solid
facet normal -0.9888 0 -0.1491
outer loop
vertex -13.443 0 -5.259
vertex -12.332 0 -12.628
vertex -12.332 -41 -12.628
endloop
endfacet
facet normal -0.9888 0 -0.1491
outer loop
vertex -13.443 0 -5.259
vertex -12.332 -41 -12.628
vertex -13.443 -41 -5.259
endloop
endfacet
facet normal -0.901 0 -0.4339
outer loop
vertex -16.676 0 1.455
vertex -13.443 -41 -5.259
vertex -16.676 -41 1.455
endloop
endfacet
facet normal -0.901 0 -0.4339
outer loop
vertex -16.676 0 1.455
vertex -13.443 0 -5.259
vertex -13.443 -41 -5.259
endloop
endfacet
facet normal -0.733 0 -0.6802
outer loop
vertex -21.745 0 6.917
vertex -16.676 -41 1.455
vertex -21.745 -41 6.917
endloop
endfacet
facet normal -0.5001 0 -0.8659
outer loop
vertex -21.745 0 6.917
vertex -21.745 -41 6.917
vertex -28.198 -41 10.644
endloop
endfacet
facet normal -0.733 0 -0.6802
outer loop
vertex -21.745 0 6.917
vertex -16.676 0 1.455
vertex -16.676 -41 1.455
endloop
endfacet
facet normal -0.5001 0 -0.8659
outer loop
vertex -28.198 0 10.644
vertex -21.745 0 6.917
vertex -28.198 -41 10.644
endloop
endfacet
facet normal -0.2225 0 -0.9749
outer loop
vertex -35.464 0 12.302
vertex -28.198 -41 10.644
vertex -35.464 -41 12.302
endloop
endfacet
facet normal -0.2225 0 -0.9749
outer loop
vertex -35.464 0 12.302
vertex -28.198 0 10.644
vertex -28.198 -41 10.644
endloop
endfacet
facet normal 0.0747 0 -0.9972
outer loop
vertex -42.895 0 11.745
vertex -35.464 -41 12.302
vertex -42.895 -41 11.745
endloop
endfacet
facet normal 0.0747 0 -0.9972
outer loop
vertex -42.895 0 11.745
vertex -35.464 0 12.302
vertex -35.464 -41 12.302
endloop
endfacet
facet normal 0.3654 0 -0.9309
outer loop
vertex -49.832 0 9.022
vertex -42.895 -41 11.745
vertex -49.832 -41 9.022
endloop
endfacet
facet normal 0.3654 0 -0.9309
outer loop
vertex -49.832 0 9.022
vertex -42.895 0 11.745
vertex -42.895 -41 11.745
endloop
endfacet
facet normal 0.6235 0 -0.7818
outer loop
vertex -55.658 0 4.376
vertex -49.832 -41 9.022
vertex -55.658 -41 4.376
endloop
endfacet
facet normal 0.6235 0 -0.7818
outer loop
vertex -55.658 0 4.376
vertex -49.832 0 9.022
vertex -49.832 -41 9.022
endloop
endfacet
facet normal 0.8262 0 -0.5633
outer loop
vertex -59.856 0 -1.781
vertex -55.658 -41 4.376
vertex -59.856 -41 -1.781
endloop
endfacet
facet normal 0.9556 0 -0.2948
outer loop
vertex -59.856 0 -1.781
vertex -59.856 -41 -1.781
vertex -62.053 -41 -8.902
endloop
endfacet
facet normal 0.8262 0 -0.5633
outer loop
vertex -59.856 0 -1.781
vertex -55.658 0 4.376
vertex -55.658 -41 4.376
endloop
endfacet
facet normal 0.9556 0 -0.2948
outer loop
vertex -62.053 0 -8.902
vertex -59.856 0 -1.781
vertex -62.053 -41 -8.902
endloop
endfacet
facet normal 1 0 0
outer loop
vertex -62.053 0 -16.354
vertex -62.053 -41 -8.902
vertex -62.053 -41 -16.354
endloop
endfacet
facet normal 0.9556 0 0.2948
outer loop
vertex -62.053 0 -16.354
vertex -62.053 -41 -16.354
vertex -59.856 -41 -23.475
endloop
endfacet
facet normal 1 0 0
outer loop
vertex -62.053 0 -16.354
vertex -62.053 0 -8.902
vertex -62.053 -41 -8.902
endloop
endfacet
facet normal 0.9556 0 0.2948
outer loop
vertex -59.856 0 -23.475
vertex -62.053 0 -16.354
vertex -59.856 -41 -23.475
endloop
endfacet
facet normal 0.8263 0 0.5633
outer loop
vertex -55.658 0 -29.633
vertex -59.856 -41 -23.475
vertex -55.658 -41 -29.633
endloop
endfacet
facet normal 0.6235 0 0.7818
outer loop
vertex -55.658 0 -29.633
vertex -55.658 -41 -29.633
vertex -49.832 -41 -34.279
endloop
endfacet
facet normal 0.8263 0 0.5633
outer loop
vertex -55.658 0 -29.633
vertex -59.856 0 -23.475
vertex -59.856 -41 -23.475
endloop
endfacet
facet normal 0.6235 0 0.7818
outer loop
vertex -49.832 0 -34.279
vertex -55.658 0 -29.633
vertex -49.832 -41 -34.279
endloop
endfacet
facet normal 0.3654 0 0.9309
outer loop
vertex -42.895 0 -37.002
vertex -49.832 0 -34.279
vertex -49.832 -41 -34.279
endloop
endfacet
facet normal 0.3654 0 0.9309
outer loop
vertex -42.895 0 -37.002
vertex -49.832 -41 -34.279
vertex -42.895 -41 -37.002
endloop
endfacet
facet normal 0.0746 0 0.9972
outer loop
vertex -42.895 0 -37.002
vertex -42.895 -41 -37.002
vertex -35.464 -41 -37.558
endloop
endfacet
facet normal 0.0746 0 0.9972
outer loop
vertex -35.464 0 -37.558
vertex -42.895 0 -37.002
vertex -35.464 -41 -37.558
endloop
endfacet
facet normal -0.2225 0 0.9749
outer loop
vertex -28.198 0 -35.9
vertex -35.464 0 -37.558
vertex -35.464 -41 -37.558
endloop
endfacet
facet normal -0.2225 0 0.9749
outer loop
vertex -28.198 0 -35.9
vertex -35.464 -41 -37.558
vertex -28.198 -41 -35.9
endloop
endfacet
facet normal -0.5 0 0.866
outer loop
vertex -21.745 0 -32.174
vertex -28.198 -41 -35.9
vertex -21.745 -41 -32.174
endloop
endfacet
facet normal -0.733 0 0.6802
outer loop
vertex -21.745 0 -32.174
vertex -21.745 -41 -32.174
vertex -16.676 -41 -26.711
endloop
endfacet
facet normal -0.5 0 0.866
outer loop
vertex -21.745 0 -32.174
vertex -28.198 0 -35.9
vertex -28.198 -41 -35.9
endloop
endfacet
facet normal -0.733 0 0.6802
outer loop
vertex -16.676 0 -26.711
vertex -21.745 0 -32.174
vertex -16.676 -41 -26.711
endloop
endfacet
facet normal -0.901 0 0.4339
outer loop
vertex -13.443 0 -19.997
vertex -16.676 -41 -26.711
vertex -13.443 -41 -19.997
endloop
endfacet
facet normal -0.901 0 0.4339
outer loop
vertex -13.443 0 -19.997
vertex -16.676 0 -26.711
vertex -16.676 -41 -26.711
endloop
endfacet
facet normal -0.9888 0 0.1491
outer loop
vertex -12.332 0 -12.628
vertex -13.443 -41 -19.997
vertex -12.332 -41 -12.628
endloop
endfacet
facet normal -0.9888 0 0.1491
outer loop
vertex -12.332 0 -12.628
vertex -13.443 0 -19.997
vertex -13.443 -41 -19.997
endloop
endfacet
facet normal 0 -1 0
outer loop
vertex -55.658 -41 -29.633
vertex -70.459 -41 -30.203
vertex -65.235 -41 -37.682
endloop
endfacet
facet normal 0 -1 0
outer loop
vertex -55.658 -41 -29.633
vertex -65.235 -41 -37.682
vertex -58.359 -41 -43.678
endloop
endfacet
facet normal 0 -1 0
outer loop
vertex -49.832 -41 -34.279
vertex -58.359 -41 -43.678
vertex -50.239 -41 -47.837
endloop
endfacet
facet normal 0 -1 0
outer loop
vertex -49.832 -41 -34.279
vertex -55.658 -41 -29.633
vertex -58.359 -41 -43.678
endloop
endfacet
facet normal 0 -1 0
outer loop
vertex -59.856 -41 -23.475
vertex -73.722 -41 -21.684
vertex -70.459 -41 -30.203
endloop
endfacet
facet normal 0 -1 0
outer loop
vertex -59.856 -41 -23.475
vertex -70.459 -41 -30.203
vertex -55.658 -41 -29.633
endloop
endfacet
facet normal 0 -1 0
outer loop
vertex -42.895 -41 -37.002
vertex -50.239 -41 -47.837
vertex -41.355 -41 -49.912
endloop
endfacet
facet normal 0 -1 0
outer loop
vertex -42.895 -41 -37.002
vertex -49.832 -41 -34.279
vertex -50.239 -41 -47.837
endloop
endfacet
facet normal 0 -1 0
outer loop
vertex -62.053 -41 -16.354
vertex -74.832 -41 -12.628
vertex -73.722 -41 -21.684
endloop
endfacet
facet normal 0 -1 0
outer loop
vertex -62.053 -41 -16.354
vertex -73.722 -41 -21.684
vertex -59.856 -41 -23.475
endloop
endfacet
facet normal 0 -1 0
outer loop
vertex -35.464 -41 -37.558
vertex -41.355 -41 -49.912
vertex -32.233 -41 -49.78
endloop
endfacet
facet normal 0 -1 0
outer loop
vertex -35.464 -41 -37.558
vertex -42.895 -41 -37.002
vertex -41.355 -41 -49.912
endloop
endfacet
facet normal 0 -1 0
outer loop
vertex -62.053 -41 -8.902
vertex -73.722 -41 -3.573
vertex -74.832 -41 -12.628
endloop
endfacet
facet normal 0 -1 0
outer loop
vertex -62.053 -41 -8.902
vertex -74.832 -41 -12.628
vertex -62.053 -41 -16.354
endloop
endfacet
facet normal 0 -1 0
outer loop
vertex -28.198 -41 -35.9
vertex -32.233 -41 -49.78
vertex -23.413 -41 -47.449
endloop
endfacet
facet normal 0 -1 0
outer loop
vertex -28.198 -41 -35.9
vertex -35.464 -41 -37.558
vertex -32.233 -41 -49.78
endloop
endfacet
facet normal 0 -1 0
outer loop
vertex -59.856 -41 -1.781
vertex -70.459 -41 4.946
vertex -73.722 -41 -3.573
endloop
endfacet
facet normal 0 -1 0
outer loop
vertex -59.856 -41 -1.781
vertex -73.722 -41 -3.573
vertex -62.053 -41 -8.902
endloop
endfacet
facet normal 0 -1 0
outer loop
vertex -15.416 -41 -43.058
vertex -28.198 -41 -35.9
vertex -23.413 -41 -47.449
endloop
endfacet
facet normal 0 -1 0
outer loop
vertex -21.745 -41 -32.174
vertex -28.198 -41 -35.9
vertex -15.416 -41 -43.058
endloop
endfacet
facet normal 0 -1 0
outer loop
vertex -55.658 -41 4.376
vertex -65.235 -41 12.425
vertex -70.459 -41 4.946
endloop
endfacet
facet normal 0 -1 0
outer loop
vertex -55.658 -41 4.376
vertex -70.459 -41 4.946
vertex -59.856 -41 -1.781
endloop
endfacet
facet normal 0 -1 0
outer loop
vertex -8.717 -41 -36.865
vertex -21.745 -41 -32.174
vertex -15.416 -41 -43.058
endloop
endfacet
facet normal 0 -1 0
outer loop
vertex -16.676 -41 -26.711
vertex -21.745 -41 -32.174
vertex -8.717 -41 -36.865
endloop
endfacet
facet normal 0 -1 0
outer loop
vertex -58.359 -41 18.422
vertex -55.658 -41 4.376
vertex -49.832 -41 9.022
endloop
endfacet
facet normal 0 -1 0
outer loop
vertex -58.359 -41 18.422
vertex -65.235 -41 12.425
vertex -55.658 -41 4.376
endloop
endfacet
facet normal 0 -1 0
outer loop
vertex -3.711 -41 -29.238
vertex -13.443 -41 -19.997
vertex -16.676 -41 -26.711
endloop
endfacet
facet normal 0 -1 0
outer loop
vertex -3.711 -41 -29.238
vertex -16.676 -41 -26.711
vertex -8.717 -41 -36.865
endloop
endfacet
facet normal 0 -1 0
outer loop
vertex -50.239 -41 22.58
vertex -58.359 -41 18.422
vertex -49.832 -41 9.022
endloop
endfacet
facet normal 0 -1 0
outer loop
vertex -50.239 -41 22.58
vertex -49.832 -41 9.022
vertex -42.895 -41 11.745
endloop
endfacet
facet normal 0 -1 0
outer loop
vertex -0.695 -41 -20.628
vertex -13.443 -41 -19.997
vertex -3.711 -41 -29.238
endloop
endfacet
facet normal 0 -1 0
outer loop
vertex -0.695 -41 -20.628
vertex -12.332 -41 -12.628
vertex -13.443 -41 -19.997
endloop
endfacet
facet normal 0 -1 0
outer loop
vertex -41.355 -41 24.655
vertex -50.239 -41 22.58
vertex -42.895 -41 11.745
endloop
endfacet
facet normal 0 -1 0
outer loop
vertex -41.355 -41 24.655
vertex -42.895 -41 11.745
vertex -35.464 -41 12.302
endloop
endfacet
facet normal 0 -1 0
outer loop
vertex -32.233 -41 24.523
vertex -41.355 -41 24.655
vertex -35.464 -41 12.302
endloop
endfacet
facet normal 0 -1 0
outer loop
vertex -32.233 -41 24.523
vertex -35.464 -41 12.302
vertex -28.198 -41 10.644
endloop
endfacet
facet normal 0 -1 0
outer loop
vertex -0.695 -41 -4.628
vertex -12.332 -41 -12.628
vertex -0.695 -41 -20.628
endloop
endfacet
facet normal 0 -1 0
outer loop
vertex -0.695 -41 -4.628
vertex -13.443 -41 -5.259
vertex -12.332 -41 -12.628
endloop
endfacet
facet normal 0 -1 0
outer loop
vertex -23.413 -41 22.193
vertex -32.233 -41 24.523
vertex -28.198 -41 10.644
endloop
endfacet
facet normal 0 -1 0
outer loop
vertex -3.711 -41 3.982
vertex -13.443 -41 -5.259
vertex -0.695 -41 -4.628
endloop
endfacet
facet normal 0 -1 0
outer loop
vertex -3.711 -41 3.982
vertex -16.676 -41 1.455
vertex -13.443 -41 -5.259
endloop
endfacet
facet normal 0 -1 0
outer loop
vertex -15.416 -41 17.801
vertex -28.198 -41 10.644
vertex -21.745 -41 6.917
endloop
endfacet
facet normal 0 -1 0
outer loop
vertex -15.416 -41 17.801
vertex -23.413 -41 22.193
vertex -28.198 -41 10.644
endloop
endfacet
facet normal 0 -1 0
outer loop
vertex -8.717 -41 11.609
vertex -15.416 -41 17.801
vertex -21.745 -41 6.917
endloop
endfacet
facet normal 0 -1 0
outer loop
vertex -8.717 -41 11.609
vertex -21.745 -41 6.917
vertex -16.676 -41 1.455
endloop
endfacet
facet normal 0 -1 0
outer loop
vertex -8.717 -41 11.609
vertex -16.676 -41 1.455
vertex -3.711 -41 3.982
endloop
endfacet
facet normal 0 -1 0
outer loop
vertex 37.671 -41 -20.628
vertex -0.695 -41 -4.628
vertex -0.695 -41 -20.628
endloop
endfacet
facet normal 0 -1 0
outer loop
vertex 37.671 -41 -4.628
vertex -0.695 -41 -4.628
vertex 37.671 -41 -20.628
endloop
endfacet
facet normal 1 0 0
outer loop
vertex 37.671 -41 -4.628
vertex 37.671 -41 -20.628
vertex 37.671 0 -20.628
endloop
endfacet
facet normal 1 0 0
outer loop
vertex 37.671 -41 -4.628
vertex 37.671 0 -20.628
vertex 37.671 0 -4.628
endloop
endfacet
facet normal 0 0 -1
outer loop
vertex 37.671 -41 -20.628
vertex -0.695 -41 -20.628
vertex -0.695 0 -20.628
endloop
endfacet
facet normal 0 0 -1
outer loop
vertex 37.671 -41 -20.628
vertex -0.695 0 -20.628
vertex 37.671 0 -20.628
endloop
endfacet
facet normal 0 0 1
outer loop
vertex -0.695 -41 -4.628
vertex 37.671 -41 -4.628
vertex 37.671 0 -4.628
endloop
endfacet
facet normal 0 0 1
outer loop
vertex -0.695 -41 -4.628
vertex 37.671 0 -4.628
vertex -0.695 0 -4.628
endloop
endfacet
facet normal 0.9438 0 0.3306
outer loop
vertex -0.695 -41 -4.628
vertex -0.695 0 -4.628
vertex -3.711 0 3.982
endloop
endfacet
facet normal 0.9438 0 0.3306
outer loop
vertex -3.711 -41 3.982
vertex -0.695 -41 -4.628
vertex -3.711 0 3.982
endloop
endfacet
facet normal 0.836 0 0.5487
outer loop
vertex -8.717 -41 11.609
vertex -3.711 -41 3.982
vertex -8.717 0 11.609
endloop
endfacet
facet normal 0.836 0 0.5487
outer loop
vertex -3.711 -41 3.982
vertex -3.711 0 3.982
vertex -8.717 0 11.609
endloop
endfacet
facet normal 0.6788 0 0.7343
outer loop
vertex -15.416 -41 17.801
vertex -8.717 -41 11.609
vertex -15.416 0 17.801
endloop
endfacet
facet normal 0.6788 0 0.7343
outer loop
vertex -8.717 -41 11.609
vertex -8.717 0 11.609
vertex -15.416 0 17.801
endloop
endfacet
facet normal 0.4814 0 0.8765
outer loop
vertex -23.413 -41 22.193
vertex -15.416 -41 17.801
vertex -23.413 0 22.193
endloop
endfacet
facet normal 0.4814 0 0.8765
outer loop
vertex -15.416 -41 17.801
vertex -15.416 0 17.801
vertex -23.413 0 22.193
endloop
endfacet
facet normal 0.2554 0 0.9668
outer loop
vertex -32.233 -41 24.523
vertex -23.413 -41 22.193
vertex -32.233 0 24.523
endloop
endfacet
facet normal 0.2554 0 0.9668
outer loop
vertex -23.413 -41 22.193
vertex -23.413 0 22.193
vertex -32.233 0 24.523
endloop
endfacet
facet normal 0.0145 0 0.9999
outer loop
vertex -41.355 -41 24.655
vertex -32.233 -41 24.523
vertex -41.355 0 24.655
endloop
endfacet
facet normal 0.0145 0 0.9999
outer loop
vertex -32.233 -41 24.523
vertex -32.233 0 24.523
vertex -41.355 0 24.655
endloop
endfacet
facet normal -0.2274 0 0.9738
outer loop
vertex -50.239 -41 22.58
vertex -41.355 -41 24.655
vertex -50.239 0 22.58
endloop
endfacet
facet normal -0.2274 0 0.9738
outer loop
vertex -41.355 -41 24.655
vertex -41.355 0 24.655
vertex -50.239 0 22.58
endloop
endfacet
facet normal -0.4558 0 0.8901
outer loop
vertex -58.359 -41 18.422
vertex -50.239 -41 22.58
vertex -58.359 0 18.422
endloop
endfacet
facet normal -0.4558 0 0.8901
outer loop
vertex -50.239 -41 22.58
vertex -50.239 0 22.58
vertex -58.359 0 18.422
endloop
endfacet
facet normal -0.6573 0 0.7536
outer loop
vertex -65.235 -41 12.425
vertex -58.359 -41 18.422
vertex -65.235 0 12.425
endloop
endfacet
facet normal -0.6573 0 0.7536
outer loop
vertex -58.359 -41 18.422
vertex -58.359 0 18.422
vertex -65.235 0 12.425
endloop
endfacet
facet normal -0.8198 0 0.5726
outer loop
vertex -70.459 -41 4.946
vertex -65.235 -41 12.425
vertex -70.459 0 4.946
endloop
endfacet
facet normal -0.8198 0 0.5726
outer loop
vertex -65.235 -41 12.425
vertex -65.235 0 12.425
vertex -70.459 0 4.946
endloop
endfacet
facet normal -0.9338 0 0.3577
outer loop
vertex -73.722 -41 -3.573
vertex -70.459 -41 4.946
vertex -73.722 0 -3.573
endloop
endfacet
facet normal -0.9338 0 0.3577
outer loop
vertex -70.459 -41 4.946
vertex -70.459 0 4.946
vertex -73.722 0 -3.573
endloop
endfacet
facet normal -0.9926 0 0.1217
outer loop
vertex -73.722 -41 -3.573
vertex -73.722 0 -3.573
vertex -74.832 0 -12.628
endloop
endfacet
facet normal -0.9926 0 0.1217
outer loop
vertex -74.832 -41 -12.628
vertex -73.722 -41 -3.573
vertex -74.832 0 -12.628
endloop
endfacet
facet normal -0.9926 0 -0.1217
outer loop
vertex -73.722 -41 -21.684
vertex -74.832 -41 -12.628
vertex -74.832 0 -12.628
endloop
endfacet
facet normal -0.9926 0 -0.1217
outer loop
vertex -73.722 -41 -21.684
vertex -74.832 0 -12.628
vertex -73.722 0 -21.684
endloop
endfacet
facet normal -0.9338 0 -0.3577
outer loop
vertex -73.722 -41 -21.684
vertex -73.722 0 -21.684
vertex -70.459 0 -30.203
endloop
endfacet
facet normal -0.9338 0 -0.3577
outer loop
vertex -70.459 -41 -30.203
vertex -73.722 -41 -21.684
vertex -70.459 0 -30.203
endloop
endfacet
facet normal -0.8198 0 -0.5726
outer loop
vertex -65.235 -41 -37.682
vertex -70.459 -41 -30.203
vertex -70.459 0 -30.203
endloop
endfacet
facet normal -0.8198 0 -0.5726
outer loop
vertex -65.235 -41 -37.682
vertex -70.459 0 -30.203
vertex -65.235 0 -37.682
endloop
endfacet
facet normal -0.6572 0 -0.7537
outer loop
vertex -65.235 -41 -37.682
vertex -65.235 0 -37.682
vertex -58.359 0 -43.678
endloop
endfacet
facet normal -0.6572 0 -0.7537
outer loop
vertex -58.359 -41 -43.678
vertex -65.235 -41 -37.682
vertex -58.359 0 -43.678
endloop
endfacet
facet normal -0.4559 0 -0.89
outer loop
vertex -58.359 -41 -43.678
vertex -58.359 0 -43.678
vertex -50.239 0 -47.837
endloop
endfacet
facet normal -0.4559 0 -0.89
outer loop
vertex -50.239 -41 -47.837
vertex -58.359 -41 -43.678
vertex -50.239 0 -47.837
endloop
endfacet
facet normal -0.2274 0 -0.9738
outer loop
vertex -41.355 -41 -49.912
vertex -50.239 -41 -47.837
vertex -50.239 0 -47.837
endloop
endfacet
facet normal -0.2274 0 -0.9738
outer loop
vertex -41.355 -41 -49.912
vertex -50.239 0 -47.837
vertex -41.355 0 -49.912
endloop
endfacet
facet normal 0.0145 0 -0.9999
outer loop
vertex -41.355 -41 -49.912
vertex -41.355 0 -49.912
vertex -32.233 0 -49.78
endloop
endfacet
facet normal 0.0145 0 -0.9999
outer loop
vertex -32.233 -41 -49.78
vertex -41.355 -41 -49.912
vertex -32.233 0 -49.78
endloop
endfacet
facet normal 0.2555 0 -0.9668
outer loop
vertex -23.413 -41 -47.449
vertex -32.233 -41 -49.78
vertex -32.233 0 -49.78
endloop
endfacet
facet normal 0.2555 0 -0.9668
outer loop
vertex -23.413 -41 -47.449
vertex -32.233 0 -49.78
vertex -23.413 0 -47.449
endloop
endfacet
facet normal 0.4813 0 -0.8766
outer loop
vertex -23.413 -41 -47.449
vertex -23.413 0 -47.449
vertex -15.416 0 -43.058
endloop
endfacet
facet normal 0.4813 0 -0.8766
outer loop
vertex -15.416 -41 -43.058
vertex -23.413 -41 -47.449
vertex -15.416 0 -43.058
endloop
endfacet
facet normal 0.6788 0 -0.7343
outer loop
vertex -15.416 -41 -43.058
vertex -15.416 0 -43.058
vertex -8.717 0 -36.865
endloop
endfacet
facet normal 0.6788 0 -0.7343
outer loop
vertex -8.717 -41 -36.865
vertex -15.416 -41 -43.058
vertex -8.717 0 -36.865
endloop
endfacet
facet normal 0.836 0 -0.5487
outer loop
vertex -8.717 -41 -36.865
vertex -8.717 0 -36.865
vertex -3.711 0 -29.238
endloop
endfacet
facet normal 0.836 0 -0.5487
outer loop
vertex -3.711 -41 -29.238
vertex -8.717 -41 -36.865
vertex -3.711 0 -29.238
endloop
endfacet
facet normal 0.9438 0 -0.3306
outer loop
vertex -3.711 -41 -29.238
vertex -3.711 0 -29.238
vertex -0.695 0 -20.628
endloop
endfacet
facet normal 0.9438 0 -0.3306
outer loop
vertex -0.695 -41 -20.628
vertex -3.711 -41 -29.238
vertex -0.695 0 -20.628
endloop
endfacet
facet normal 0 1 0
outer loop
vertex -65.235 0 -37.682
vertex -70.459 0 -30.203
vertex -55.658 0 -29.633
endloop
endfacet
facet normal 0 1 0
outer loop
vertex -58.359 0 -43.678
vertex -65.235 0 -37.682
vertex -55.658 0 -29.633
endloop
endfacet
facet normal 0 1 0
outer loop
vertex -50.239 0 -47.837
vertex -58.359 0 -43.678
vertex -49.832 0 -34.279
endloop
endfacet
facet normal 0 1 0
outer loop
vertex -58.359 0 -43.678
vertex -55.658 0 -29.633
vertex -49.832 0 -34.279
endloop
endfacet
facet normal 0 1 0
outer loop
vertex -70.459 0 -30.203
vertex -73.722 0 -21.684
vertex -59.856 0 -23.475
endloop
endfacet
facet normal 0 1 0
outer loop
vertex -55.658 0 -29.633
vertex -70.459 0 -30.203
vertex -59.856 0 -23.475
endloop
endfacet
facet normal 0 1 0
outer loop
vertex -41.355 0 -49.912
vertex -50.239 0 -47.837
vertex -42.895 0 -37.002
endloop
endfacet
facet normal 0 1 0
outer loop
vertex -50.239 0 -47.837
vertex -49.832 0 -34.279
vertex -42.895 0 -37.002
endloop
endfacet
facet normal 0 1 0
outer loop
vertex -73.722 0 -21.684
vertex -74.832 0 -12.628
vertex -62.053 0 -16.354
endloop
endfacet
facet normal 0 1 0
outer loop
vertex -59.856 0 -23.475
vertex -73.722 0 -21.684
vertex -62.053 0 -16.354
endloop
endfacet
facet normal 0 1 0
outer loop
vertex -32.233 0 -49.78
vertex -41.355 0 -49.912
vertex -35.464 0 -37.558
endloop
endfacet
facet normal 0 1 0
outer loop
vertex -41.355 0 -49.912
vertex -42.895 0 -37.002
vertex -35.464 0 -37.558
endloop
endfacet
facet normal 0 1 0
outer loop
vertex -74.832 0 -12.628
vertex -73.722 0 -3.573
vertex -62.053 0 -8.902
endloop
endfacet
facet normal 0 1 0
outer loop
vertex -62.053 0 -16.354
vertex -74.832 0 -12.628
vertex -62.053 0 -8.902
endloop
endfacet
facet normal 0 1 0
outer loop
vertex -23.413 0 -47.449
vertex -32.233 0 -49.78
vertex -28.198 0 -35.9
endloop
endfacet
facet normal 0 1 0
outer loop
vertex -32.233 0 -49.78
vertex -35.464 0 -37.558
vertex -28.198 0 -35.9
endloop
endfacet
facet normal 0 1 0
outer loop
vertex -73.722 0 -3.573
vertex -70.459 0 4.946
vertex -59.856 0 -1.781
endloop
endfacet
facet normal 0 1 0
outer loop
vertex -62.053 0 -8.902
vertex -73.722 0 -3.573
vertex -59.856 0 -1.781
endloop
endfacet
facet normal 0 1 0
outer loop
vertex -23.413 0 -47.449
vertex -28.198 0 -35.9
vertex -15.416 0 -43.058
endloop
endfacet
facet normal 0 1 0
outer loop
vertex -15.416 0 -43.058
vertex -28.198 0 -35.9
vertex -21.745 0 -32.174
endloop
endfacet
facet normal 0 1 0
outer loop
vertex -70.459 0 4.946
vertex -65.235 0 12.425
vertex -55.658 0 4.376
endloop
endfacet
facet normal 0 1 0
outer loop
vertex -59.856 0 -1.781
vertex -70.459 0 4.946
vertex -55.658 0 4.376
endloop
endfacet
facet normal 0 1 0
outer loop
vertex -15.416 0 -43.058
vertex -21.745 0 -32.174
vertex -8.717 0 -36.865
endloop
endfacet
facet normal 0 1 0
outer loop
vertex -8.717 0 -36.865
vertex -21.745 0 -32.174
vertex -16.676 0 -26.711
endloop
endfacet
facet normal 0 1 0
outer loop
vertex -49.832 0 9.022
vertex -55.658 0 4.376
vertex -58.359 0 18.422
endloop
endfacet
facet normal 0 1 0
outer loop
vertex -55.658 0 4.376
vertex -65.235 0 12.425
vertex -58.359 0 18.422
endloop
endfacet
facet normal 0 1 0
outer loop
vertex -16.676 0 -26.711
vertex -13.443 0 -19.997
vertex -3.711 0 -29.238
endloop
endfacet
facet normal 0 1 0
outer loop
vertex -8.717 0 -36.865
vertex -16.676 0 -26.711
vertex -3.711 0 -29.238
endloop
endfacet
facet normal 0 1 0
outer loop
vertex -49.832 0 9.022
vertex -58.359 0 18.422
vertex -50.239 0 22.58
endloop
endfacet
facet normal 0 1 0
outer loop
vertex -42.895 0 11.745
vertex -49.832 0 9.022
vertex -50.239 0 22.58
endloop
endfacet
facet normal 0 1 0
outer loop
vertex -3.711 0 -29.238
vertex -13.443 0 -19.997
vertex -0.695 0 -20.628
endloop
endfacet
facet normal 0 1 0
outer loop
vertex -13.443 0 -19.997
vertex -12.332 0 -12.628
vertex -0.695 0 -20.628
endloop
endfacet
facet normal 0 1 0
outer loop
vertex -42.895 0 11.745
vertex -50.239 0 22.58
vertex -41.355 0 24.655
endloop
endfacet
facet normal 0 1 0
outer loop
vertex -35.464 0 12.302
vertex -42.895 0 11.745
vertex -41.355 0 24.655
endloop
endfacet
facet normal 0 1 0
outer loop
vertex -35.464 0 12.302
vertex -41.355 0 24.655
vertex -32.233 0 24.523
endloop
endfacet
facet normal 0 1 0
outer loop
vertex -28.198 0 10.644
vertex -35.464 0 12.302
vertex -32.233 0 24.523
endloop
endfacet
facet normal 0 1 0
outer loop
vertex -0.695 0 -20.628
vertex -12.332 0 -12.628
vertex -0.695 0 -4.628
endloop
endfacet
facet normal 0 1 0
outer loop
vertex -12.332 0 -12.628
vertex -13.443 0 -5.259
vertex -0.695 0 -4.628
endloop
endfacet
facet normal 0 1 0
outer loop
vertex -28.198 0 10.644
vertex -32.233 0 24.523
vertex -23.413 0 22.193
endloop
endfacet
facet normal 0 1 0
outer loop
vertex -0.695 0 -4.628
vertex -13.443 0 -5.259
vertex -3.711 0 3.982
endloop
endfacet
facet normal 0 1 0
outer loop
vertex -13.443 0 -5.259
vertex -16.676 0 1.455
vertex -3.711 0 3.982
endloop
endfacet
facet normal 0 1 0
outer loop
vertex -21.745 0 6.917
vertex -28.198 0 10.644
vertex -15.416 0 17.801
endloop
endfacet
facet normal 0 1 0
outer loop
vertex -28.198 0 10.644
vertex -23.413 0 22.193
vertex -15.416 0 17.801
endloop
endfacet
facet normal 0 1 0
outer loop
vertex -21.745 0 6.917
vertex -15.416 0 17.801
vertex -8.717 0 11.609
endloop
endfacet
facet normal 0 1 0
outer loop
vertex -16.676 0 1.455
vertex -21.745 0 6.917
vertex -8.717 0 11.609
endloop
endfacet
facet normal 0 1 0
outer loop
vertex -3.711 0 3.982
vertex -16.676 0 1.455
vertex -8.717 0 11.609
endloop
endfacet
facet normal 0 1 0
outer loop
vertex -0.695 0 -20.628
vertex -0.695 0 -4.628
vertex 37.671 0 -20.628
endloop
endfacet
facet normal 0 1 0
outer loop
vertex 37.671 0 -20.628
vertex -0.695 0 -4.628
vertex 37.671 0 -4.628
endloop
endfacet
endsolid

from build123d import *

# Parameters (mm, degrees)
F0_R     = 37.5
F0_R_2   = 25
F1_DEPTH = 41
F3_DEPTH = 41


with BuildPart() as f1:
    # F0 (on Front) → F1 (new body)
    with BuildSketch(Plane.XZ):
        with Locations((-37.331857, -12.628307)):
            Circle(F0_R)
        with Locations((-37.331857, -12.628307)):
            Circle(F0_R_2, mode=Mode.SUBTRACT)
    extrude(amount=F1_DEPTH)

    # F2 (on face) → F3 (join)
    with BuildSketch(Plane.XZ.offset(41)):
        with BuildLine():
            Line((37.671292, -20.628307), (37.671292, -12.628307))
            Line((37.671292, -12.628307), (37.671292, -4.628307))
            Line((37.671292, -4.628307), (-0.695127, -4.628307))
            ThreePointArc((-0.695127, -4.628307), (-0.048299, -8.605085), (0.168143, -12.628307))
            ThreePointArc((0.168143, -12.628307), (-0.048299, -16.651528), (-0.695127, -20.628307))
            Line((-0.695127, -20.628307), (37.671292, -20.628307))
        make_face()
    extrude(amount=-F3_DEPTH)


solid = f1.part
